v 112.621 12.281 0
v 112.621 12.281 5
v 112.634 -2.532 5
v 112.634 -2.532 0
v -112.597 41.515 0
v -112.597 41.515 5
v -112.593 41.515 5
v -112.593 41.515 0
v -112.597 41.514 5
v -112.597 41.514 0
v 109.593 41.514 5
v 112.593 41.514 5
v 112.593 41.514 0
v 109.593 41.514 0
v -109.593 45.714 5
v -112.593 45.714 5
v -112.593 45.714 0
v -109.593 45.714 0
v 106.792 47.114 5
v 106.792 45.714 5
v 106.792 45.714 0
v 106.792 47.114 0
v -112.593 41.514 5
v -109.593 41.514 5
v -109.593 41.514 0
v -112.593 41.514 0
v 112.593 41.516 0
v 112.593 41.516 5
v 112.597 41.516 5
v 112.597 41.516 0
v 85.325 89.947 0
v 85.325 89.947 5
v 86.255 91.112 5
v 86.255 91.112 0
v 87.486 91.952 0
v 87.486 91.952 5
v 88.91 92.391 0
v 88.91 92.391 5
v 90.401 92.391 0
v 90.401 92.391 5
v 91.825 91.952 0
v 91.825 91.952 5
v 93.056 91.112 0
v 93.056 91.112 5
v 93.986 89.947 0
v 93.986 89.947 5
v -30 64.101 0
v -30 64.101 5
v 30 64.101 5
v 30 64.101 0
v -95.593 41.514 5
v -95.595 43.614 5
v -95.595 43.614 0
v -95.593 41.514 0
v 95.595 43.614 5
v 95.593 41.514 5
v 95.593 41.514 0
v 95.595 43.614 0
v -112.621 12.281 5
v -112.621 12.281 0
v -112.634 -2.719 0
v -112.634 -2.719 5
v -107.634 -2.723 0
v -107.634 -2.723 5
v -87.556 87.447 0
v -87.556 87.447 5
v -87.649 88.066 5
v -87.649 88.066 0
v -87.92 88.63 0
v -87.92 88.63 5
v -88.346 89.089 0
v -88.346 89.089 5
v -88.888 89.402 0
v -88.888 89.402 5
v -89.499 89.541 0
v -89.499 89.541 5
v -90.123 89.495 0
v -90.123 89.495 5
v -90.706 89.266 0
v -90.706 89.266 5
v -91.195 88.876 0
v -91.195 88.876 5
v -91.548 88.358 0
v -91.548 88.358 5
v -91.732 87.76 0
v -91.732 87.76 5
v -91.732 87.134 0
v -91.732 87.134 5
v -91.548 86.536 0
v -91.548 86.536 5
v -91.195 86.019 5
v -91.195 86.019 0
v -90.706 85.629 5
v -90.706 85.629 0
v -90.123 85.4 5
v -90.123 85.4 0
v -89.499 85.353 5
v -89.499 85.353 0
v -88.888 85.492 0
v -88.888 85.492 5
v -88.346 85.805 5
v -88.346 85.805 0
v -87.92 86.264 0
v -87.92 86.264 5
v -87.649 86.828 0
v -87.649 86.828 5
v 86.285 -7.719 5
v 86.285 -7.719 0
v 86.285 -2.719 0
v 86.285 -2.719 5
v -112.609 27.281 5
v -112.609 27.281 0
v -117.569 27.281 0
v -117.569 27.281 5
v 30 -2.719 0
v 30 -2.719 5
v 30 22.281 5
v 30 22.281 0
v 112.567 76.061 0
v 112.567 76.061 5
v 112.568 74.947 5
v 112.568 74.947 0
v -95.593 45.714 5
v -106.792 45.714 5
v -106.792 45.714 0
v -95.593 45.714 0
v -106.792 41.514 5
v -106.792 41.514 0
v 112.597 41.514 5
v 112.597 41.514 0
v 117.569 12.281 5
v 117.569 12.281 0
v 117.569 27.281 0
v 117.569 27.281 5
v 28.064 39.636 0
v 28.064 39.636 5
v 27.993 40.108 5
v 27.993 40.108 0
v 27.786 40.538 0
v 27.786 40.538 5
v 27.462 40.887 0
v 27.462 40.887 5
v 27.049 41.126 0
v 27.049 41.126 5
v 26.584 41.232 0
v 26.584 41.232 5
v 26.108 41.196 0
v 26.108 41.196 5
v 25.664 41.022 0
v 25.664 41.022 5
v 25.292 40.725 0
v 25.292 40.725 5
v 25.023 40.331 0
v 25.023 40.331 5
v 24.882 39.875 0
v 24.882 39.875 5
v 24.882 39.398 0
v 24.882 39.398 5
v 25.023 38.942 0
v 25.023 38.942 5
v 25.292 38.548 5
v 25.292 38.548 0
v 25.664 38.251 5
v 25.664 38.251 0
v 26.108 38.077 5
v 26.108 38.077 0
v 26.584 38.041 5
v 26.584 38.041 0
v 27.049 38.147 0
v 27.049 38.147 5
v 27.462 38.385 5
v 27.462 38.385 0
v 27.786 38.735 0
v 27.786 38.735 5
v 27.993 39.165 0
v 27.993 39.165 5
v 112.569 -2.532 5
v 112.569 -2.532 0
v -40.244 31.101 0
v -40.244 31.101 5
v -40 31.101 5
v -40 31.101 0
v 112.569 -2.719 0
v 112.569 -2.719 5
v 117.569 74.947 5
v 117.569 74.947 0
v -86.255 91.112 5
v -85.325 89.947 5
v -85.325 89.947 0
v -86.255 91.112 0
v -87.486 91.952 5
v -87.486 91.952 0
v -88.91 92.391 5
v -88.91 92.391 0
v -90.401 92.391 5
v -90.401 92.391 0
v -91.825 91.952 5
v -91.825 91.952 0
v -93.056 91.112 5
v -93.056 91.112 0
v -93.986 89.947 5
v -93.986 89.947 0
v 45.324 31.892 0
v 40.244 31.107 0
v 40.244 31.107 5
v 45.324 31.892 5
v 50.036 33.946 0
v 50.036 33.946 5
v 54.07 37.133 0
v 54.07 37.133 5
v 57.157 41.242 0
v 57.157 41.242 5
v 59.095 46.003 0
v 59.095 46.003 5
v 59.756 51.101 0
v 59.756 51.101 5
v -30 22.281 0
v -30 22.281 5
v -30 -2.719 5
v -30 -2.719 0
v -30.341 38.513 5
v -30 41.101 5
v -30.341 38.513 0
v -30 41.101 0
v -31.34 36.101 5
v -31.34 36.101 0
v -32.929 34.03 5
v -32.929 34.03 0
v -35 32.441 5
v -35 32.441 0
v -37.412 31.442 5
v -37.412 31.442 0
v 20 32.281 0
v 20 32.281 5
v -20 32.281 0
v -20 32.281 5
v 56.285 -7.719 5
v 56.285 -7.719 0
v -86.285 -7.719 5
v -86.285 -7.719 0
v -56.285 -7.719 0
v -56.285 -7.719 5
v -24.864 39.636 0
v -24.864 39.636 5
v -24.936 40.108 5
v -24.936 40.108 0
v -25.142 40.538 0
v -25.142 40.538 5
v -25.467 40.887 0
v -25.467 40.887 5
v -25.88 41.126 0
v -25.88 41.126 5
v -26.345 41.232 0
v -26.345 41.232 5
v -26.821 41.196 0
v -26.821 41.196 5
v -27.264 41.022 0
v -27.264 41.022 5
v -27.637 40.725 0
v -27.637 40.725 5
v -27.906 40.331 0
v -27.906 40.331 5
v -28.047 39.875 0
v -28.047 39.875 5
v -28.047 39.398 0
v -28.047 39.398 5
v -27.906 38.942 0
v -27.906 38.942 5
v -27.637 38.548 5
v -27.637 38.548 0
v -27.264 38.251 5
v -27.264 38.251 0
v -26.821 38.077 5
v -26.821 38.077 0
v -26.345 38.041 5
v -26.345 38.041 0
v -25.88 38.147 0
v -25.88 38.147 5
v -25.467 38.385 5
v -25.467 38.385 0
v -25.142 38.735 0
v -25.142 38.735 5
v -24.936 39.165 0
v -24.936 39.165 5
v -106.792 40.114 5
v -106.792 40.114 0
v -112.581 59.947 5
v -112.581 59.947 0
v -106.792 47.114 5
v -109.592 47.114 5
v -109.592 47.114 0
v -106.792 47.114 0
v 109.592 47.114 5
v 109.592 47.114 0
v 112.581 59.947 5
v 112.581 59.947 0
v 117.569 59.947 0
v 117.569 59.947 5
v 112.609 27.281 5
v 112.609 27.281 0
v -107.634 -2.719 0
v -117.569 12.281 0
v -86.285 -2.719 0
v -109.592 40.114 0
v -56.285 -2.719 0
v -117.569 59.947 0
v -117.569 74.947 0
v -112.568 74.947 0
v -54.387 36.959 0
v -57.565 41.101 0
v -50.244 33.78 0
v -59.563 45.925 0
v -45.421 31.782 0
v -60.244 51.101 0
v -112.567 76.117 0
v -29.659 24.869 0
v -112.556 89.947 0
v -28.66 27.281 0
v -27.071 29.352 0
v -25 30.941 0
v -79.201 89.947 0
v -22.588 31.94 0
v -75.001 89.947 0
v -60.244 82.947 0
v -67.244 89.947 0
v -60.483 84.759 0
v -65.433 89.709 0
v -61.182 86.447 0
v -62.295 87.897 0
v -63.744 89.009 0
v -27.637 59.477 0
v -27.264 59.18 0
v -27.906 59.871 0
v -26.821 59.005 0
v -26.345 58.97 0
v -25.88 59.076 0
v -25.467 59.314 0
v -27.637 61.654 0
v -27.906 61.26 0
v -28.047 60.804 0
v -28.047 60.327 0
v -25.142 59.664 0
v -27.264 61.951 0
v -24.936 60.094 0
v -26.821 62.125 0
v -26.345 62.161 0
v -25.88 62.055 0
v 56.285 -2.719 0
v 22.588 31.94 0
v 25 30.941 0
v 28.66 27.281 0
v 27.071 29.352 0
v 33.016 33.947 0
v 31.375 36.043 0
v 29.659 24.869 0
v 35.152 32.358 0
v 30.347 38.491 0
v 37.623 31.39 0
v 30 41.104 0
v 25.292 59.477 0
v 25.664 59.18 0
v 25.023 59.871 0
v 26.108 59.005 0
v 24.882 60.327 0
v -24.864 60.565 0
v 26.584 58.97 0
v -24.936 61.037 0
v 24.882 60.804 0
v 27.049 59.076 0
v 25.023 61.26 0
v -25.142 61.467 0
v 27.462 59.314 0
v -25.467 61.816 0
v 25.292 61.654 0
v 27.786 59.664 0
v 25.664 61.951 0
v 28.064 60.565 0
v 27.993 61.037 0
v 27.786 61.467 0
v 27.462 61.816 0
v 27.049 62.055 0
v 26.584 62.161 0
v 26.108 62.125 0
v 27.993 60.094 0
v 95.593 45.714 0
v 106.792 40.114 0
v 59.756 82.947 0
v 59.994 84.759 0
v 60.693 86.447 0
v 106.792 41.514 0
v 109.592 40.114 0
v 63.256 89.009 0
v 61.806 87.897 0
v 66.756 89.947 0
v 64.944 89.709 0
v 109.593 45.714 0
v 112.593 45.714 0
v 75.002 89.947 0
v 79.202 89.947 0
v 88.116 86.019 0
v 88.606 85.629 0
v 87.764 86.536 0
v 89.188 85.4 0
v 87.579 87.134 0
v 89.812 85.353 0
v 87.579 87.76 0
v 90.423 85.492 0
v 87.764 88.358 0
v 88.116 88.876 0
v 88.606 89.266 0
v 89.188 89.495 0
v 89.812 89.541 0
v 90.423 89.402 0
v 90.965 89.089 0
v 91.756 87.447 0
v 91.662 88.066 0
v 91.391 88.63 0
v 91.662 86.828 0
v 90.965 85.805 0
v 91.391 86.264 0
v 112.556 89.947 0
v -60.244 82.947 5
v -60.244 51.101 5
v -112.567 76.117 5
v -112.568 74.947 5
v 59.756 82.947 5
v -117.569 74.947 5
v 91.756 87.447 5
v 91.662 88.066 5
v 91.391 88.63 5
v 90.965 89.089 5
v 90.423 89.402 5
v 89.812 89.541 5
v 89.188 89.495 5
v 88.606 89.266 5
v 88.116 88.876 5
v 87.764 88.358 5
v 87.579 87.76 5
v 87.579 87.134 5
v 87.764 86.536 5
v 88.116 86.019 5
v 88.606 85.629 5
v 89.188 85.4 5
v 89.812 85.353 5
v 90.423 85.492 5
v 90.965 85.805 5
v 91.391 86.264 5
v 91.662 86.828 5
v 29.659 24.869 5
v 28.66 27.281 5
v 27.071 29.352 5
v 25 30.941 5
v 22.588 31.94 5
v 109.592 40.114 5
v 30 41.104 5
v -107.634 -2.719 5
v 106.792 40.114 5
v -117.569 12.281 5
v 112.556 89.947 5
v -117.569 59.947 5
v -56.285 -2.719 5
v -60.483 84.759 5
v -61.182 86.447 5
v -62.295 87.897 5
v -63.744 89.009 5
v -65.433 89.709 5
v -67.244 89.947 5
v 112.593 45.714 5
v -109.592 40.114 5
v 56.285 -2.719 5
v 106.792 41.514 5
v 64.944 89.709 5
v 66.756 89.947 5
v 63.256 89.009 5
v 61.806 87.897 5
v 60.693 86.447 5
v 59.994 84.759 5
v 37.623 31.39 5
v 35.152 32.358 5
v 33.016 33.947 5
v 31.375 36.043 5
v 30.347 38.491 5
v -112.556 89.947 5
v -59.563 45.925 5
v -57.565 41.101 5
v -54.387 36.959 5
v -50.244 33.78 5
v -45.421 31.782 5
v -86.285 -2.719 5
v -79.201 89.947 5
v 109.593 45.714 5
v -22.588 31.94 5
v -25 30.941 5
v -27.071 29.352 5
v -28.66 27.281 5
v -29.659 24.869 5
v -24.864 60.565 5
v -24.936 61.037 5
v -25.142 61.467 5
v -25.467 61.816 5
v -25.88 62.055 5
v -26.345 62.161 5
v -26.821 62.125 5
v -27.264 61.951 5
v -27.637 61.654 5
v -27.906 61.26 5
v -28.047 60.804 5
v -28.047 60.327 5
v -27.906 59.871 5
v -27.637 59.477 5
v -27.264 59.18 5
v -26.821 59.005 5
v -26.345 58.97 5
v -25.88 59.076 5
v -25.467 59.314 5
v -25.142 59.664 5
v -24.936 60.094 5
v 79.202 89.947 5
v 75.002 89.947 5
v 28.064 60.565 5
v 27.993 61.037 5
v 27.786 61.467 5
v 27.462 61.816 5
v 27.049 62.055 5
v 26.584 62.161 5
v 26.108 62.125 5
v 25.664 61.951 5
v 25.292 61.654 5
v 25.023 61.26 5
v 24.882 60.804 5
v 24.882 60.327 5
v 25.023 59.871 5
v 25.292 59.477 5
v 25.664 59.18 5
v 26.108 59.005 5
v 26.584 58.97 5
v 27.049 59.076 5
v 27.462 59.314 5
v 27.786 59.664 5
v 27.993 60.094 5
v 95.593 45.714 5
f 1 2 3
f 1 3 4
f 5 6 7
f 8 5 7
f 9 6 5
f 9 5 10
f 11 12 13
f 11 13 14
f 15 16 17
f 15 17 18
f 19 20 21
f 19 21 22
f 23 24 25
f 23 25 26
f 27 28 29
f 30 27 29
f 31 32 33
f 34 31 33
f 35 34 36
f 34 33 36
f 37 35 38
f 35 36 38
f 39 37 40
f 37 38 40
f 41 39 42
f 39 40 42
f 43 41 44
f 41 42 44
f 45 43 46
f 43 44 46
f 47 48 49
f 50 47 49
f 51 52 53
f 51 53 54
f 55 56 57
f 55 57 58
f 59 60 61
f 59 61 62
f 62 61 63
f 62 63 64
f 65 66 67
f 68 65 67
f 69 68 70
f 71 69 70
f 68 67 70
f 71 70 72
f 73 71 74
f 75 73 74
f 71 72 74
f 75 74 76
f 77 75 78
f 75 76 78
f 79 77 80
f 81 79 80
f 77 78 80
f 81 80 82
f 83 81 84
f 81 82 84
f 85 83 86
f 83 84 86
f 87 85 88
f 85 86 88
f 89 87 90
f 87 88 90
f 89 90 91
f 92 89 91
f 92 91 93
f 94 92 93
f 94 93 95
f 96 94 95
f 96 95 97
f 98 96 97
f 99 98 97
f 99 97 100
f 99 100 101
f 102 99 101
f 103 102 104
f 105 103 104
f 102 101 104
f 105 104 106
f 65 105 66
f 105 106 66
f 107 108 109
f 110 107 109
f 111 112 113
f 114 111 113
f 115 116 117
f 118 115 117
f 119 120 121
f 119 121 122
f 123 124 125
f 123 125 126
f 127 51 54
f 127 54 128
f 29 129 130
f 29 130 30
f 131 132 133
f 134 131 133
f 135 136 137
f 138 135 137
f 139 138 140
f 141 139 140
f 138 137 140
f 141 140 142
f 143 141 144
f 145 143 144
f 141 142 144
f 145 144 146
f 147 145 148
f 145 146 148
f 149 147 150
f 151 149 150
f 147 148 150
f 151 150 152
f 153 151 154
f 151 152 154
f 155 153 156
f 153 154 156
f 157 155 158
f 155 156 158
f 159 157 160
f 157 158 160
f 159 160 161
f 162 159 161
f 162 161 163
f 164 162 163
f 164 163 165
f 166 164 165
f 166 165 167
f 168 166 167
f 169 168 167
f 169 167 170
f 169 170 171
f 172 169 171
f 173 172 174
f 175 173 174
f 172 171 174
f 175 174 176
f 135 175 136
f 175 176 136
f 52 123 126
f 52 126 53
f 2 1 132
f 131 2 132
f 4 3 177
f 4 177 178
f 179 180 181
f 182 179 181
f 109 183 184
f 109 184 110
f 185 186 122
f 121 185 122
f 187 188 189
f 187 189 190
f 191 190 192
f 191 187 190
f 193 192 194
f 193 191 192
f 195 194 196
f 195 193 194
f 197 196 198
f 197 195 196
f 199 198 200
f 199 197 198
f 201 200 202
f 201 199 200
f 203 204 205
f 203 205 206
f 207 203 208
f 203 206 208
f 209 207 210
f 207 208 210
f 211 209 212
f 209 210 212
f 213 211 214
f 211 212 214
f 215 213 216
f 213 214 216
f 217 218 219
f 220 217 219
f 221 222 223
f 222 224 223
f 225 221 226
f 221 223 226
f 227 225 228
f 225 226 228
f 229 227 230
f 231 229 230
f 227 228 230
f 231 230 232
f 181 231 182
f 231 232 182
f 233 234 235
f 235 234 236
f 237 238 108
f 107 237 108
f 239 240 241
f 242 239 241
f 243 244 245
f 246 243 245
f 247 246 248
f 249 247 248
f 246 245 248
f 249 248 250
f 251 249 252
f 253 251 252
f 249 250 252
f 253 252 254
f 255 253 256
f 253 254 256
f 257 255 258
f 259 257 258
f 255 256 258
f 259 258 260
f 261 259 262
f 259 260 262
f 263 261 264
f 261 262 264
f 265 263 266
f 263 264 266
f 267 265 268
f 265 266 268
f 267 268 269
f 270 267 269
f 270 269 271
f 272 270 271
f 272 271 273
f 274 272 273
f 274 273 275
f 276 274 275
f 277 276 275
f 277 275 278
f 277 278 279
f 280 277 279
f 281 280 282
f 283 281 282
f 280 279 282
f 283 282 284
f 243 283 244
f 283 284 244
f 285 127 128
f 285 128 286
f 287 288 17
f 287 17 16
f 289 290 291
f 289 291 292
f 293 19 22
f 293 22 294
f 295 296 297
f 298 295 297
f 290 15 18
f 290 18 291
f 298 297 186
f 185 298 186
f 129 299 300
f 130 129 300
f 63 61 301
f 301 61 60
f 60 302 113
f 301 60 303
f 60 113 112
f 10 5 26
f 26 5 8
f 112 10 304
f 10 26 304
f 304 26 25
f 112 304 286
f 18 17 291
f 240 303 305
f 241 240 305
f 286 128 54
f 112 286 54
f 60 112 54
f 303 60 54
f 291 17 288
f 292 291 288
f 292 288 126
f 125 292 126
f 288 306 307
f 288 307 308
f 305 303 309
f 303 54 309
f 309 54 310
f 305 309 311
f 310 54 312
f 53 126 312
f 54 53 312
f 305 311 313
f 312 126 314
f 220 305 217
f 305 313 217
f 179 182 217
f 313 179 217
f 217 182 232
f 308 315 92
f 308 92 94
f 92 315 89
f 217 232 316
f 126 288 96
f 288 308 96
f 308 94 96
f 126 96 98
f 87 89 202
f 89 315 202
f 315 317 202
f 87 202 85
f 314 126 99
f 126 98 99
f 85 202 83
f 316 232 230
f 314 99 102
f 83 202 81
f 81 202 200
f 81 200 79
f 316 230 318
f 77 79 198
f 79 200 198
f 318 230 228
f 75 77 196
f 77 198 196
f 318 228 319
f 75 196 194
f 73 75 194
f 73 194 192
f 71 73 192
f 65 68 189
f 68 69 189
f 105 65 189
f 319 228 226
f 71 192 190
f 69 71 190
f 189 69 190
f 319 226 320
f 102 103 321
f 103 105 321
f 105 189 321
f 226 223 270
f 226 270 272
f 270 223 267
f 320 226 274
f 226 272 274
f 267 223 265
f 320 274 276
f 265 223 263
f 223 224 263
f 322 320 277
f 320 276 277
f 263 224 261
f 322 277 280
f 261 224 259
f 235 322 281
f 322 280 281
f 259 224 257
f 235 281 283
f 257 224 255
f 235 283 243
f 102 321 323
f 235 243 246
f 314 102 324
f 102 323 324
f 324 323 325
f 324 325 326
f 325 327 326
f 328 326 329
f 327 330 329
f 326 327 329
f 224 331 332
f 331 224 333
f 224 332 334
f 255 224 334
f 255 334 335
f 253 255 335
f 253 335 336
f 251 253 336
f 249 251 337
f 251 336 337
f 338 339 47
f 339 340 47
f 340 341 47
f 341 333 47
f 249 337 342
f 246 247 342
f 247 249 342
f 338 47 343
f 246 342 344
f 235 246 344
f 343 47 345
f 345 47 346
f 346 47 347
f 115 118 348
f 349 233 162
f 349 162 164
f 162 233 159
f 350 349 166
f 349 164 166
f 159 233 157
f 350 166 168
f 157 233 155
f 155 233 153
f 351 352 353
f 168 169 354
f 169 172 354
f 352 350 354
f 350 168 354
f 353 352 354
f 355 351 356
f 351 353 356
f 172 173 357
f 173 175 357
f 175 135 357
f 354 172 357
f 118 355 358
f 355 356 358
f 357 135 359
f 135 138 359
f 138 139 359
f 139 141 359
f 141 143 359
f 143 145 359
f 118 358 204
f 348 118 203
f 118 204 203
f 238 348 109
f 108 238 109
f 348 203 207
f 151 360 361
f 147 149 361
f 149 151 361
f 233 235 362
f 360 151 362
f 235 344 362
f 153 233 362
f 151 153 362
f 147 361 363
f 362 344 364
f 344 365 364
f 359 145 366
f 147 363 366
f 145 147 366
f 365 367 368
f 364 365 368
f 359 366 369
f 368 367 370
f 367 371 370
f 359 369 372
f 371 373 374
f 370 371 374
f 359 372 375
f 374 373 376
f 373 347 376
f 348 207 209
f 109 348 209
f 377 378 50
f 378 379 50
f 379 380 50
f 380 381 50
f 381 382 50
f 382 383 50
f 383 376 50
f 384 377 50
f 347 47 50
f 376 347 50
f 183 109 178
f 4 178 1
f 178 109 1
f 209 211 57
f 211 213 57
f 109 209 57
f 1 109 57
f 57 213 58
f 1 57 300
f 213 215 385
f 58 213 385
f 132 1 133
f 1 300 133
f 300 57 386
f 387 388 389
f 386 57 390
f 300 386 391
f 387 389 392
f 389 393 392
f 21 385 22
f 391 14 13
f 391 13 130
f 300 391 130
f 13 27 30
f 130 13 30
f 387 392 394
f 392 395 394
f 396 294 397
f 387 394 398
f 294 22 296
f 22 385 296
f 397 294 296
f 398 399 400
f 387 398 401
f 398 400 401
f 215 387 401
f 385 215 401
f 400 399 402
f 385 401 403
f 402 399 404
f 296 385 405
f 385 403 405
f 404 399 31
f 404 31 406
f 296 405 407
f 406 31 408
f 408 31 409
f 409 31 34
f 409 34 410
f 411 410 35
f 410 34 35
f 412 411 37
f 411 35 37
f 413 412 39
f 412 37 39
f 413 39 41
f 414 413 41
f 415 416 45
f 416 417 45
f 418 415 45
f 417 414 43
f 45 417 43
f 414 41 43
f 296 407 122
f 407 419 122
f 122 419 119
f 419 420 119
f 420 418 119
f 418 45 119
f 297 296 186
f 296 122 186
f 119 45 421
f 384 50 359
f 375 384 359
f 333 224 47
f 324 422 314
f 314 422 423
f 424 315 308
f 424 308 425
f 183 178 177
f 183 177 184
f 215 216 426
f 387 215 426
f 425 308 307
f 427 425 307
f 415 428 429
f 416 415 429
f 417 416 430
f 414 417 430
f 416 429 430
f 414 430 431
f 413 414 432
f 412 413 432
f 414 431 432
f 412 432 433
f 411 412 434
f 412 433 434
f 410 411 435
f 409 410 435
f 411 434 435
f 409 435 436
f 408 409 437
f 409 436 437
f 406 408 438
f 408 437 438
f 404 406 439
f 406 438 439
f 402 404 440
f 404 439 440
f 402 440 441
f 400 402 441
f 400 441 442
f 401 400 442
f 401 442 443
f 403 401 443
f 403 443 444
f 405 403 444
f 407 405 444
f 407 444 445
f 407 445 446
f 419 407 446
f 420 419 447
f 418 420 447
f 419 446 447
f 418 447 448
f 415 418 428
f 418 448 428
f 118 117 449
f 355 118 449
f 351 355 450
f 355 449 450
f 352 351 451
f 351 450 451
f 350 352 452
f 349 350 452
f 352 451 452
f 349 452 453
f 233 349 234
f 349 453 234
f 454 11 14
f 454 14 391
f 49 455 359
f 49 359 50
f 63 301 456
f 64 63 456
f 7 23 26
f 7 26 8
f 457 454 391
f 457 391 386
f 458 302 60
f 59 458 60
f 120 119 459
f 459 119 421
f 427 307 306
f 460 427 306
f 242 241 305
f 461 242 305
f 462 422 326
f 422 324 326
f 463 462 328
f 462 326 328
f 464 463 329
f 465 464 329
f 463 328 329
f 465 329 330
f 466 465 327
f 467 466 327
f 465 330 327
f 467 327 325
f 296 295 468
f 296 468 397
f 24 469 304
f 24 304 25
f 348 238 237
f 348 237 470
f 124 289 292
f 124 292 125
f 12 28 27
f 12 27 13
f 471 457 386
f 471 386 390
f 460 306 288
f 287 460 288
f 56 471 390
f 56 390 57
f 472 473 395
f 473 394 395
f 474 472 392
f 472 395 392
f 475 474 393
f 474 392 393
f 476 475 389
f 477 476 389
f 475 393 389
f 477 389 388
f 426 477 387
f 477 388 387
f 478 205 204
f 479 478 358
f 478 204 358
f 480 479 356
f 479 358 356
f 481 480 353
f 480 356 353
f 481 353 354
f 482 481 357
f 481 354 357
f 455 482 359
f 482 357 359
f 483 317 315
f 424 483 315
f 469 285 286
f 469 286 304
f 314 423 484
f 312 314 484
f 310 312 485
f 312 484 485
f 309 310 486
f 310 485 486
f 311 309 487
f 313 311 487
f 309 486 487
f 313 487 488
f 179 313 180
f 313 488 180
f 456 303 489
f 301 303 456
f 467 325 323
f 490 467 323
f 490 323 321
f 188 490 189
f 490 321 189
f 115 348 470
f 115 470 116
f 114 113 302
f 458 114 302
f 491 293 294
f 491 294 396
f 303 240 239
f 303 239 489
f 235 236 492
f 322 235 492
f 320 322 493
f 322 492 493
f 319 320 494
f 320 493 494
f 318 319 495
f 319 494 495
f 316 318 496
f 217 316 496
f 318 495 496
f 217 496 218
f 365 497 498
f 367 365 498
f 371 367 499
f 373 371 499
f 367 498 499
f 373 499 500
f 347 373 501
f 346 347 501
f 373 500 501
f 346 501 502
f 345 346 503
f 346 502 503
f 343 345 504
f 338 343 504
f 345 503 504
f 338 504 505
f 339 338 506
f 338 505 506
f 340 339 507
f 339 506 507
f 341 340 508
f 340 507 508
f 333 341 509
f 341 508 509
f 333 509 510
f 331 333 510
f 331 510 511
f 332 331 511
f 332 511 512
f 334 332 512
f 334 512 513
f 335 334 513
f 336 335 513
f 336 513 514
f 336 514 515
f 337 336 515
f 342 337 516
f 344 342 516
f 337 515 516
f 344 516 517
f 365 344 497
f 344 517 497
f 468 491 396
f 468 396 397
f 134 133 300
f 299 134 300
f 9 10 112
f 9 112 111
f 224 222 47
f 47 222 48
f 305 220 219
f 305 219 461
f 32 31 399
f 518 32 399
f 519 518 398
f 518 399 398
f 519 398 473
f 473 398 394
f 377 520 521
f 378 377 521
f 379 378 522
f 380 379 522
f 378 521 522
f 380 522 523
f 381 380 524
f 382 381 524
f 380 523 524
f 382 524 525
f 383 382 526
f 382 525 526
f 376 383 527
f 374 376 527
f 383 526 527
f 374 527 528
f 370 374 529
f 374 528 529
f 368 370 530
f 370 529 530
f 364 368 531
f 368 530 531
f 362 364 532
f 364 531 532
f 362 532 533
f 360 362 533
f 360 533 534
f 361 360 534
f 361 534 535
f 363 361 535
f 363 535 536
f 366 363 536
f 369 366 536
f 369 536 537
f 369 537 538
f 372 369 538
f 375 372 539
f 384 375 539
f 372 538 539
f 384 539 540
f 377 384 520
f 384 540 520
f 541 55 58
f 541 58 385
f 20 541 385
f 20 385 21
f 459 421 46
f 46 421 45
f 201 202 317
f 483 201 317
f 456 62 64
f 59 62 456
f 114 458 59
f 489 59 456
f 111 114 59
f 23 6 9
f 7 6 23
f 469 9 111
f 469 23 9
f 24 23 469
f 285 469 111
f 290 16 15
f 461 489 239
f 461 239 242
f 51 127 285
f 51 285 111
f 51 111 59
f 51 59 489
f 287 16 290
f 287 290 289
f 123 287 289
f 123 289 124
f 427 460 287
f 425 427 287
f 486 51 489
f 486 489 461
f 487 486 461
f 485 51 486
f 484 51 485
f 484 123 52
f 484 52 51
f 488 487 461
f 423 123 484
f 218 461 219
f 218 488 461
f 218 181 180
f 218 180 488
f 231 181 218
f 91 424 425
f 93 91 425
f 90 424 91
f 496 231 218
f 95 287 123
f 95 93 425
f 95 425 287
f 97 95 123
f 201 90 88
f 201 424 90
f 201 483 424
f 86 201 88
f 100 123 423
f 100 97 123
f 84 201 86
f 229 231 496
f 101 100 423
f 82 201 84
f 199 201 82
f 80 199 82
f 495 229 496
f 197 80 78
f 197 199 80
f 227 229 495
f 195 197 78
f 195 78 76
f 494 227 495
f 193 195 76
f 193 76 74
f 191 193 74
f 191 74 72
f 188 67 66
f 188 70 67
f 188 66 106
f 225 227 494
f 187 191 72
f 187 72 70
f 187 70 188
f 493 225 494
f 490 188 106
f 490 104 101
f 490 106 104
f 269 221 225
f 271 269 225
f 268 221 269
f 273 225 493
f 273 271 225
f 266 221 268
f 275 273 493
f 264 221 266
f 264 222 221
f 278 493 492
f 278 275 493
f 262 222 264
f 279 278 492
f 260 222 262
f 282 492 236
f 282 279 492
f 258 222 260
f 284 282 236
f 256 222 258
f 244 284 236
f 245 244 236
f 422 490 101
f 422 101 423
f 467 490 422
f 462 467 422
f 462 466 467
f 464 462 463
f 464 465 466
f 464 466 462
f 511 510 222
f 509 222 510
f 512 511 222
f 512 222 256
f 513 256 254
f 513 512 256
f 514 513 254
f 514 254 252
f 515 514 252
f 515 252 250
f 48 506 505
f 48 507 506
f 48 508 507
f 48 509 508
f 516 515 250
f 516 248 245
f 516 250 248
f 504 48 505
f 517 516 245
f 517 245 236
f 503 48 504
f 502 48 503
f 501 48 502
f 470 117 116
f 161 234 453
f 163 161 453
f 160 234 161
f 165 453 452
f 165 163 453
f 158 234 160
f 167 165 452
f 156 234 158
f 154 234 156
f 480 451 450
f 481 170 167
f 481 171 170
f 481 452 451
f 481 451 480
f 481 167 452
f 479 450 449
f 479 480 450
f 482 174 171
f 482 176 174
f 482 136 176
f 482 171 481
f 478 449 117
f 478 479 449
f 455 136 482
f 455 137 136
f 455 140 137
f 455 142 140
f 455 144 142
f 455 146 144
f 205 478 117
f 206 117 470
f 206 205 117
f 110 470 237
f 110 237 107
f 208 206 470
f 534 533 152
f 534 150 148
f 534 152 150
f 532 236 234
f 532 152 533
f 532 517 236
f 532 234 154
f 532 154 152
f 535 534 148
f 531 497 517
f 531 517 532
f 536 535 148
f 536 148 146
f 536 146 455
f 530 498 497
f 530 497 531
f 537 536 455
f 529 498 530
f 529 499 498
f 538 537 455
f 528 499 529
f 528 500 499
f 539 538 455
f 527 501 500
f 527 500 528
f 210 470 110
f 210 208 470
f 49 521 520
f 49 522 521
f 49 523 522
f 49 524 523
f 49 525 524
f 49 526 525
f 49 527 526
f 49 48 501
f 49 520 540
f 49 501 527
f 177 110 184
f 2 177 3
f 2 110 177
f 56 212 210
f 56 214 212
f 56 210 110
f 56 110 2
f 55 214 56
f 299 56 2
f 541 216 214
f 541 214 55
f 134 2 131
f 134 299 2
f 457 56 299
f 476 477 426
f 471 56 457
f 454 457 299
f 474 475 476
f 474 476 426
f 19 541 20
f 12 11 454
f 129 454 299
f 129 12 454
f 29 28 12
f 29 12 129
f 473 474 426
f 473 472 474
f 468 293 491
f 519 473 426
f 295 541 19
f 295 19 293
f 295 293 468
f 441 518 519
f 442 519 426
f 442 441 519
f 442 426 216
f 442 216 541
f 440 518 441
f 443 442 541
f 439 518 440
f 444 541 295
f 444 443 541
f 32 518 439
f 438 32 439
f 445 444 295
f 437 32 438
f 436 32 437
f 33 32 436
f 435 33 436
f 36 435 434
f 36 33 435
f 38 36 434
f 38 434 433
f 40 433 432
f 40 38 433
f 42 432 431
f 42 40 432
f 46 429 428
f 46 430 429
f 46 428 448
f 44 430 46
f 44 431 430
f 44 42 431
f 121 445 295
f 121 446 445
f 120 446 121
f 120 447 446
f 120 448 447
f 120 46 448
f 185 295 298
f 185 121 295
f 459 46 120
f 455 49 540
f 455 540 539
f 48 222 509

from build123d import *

# Parameters (mm, degrees)
BOSS_EXTRUDE1_DEPTH     = 5
BOSS_EXTRUDE2_START     = -5
BOSS_EXTRUDE2_DEPTH     = 5
CUT_EXTRUDE1_DEPTH      = 5
FILLET1_R               = 7
SKETCH5_W               = 60
SKETCH5_H               = 33
BOSS_EXTRUDE3_DEPTH     = 5
SKETCH6_R               = 1.6
CUT_EXTRUDE2_DEPTH      = 5
CUT_EXTRUDE3_START      = -5
CUT_EXTRUDE3_DEPTH      = 5
CUT_EXTRUDE4_DEPTH      = 10
FILLET2_R               = 10
BOSS_EXTRUDE5_START     = -5
BOSS_EXTRUDE5_OUTLINE_W = 30
BOSS_EXTRUDE5_OUTLINE_H = 5
BOSS_EXTRUDE5_DEPTH     = 5
SKETCH12_W              = 5
SKETCH12_H              = 92.666318873
BOSS_EXTRUDE6_DEPTH     = 5
SKETCH13_W              = 5
SKETCH13_H              = 92.479626066
BOSS_EXTRUDE7_DEPTH     = 11
SKETCH14_W              = 14.125243299
SKETCH14_H              = 18.417399827
SKETCH14_W_2            = 17.448829958
BOSS_EXTRUDE8_DEPTH     = 5
CUT_EXTRUDE5_DEPTH      = 5
SKETCH17_W              = 6.263528668
SKETCH17_H              = 4.2
SKETCH17_W_2            = 6.634448871
CUT_EXTRUDE6_DEPTH      = 5
BOSS_EXTRUDE9_DEPTH     = 5
CUT_EXTRUDE7_DEPTH      = 5
SKETCH21_W              = 3.746111535
SKETCH21_H              = 4.198684894
SKETCH21_W_2            = 4.081394213
SKETCH21_H_2            = 4.198442995
CUT_EXTRUDE8_DEPTH      = 5
BOSS_EXTRUDE10_DEPTH    = 5
SKETCH23_R              = 2.1
CUT_EXTRUDE9_DEPTH      = 5


# Read off the part's stored shape, not the designer's step: Cut-Extrude3, Boss-Extrude5
with BuildPart() as part:
    # Sketch1 → Boss-Extrude1 (new body)
    with BuildSketch(Plane.XY):
        with BuildLine():
            Line((-112.555529977, 89.947234922), (-112.567255319, 76.117234919))
            Line((-112.567255319, 76.117234919), (-109.550918722, 76.117234919))
            Line((-109.550918722, 76.117234919), (-109.550918722, 77.517234919))
            Line((-109.550918722, 77.517234919), (-106.750918722, 77.517234919))
            Line((-106.750918722, 77.517234919), (-106.750918722, 76.117234919))
            Line((-106.750918722, 76.117234919), (-95.550918722, 76.117234919))
            Line((-95.550918722, 76.117234919), (-95.550918722, 71.917234919))
            Line((-95.550918722, 71.917234919), (-106.750918722, 71.917234919))
            Line((-106.750918722, 71.917234919), (-106.750918722, 70.517234919))
            Line((-106.750918722, 70.517234919), (-109.550918722, 70.517234919))
            Line((-109.550918722, 70.517234919), (-109.550918722, 71.917234919))
            Line((-109.550918722, 71.917234919), (-112.5683672, 71.917234919))
            Line((-112.5683672, 71.917234919), (-112.56855454, 63.078549452))
            Line((-112.56855454, 63.078549452), (-112.56855454, 58.070468723))
            ThreePointArc((-112.56855454, 58.070468723), (-109.295273663, 56.47724277), (-107.97, 53.086610624))
            Line((-107.97, 53.086610624), (-107.97, -29.899029756))
            ThreePointArc((-107.97, -29.899029756), (-109.295765386, -33.290194747), (-112.57, -34.883004073))
            Line((-112.57, -34.883004073), (-112.57, -63.301209568))
            Line((-112.57, -63.301209568), (-109.57, -63.301209568))
            Line((-109.57, -63.301209568), (-109.57, -61.901209568))
            Line((-109.57, -61.901209568), (-106.77, -61.901209568))
            Line((-106.77, -61.901209568), (-106.77, -63.301209568))
            Line((-106.77, -63.301209568), (-95.57, -63.301209568))
            Line((-95.57, -63.301209568), (-95.57, -67.501209568))
            Line((-95.57, -67.501209568), (-106.77, -67.501209568))
            Line((-106.77, -67.501209568), (-106.77, -68.901209568))
            Line((-106.77, -68.901209568), (-109.57, -68.901209568))
            Line((-109.57, -68.901209568), (-109.57, -67.501209568))
            Line((-109.57, -67.501209568), (-112.57, -67.501209568))
            Line((-112.57, -67.501209568), (-112.57, -90.906209566))
            Line((-112.57, -90.906209566), (-94.225, -90.906209566))
            Line((-94.225, -90.906209566), (-94.225, -87.906209568))
            Line((-94.225, -87.906209568), (-95.625, -87.906209568))
            Line((-95.625, -87.906209568), (-95.625, -85.106209568))
            Line((-95.625, -85.106209568), (-94.225, -85.106209568))
            Line((-94.225, -85.106209568), (-94.225, -73.906209568))
            Line((-94.225, -73.906209568), (-90.025, -73.906209568))
            Line((-90.025, -73.906209568), (-90.025, -85.106209568))
            Line((-90.025, -85.106209568), (-88.625, -85.106209568))
            Line((-88.625, -85.106209568), (-88.625, -87.906209568))
            Line((-88.625, -87.906209568), (-90.025, -87.906209568))
            Line((-90.025, -87.906209568), (-90.025, -90.906209566))
            Line((-90.025, -90.906209566), (-74.478184725, -90.906209566))
            Line((-74.478184725, -90.906209566), (-58.579544248, -63.368956488))
            Line((-58.579544248, -63.368956488), (-61.177620458, -61.868956489))
            Line((-61.177620458, -61.868956489), (-61.877620458, -63.081392054))
            Line((-61.877620458, -63.081392054), (-64.302491589, -61.681392054))
            Line((-64.302491589, -61.681392054), (-63.602491589, -60.468956489))
            Line((-63.602491589, -60.468956489), (-73.301976111, -54.868956489))
            Line((-73.301976111, -54.868956489), (-71.201976111, -51.231649793))
            Line((-71.201976111, -51.231649793), (-61.502491589, -56.831649793))
            Line((-61.502491589, -56.831649793), (-60.802491589, -55.619214227))
            Line((-60.802491589, -55.619214227), (-58.377620458, -57.019214227))
            Line((-58.377620458, -57.019214227), (-59.077620458, -58.231649793))
            Line((-59.077620458, -58.231649793), (-56.479544248, -59.731649792))
            Line((-56.479544248, -59.731649792), (-39.837168574, -30.906209566))
            Line((-39.837168574, -30.906209566), (-2.099582772, -30.906209566))
            Line((-2.099582772, -30.906209566), (-2.099582772, -27.906209566))
            Line((-2.099582772, -27.906209566), (-3.499582772, -27.906209566))
            Line((-3.499582772, -27.906209566), (-3.499582772, -25.106209566))
            Line((-3.499582772, -25.106209566), (-2.099582772, -25.106209566))
            Line((-2.099582772, -25.106209566), (-2.099582772, -13.906209566))
            Line((-2.099582772, -13.906209566), (2.100417228, -13.906209566))
            Line((2.100417228, -13.906209566), (2.100417228, -25.106209566))
            Line((2.100417228, -25.106209566), (3.500417228, -25.106209566))
            Line((3.500417228, -25.106209566), (3.500417228, -27.906209566))
            Line((3.500417228, -27.906209566), (2.100417228, -27.906209566))
            Line((2.100417228, -27.906209566), (2.100417228, -30.906209566))
            Line((2.100417228, -30.906209566), (39.837168574, -30.906209566))
            Line((39.837168574, -30.906209566), (56.479752862, -59.732011122))
            Line((56.479752862, -59.732011122), (59.078454915, -58.231649793))
            Line((59.078454915, -58.231649793), (58.378454915, -57.019214227))
            Line((58.378454915, -57.019214227), (60.803326045, -55.619214227))
            Line((60.803326045, -55.619214227), (61.503326045, -56.831649793))
            Line((61.503326045, -56.831649793), (71.202810568, -51.231649793))
            Line((71.202810568, -51.231649793), (73.302810568, -54.868956489))
            Line((73.302810568, -54.868956489), (63.603326045, -60.468956489))
            Line((63.603326045, -60.468956489), (64.303326045, -61.681392054))
            Line((64.303326045, -61.681392054), (61.878454915, -63.081392054))
            Line((61.878454915, -63.081392054), (61.178454915, -61.868956489))
            Line((61.178454915, -61.868956489), (58.580378703, -63.368956489))
            Line((58.580378703, -63.368956489), (74.478184725, -90.906209566))
            Line((74.478184725, -90.906209566), (90.025834456, -90.906209566))
            Line((90.025834456, -90.906209566), (90.025834456, -87.906209568))
            Line((90.025834456, -87.906209568), (88.625834456, -87.906209568))
            Line((88.625834456, -87.906209568), (88.625834456, -85.106209568))
            Line((88.625834456, -85.106209568), (90.025834456, -85.106209568))
            Line((90.025834456, -85.106209568), (90.025834456, -73.906209568))
            Line((90.025834456, -73.906209568), (94.225834456, -73.906209568))
            Line((94.225834456, -73.906209568), (94.225834456, -85.106209568))
            Line((94.225834456, -85.106209568), (95.625834456, -85.106209568))
            Line((95.625834456, -85.106209568), (95.625834456, -87.906209568))
            Line((95.625834456, -87.906209568), (94.225834456, -87.906209568))
            Line((94.225834456, -87.906209568), (94.225834456, -90.906209566))
            Line((94.225834456, -90.906209566), (112.57, -90.906209566))
            Line((112.57, -90.906209566), (112.57, -67.501209568))
            Line((112.57, -67.501209568), (109.570834456, -67.501209568))
            Line((109.570834456, -67.501209568), (109.570834456, -68.901209568))
            Line((109.570834456, -68.901209568), (106.770834456, -68.901209568))
            Line((106.770834456, -68.901209568), (106.770834456, -67.501209568))
            Line((106.770834456, -67.501209568), (95.570834456, -67.501209568))
            Line((95.570834456, -67.501209568), (95.570834456, -63.301209568))
            Line((95.570834456, -63.301209568), (106.770834456, -63.301209568))
            Line((106.770834456, -63.301209568), (106.770834456, -61.901209568))
            Line((106.770834456, -61.901209568), (109.570834456, -61.901209568))
            Line((109.570834456, -61.901209568), (109.570834456, -63.301209568))
            Line((109.570834456, -63.301209568), (112.57, -63.301209568))
            Line((112.57, -63.301209568), (112.57, -34.883004073))
            ThreePointArc((112.57, -34.883004073), (109.295765386, -33.290194747), (107.97, -29.899029756))
            Line((107.97, -29.899029756), (107.97, 53.086610624))
            ThreePointArc((107.97, 53.086610624), (109.295273663, 56.47724277), (112.56855454, 58.070468723))
            Line((112.56855454, 58.070468723), (112.56855454, 63.078549452))
            Line((112.56855454, 63.078549452), (112.5683672, 71.917234919))
            Line((112.5683672, 71.917234919), (109.551753179, 71.917234919))
            Line((109.551753179, 71.917234919), (109.551753179, 70.517234919))
            Line((109.551753179, 70.517234919), (106.751753179, 70.517234919))
            Line((106.751753179, 70.517234919), (106.751753179, 71.917234919))
            Line((106.751753179, 71.917234919), (95.551753179, 71.917234919))
            Line((95.551753179, 71.917234919), (95.551753179, 76.117234919))
            Line((95.551753179, 76.117234919), (106.751753179, 76.117234919))
            Line((106.751753179, 76.117234919), (106.751753179, 77.517234919))
            Line((106.751753179, 77.517234919), (109.551753179, 77.517234919))
            Line((109.551753179, 77.517234919), (109.551753179, 76.117234919))
            Line((109.551753179, 76.117234919), (112.550918722, 76.117234919))
            Line((112.550918722, 76.117234919), (112.567303227, 76.060727176))
            Line((112.567303227, 76.060727176), (112.555529977, 89.947234922))
            Line((112.555529977, 89.947234922), (79.201753179, 89.947234922))
            Line((79.201753179, 89.947234922), (79.201753179, 86.947234919))
            Line((79.201753179, 86.947234919), (80.601753179, 86.947234919))
            Line((80.601753179, 86.947234919), (80.601753179, 84.147234919))
            Line((80.601753179, 84.147234919), (79.201753179, 84.147234919))
            Line((79.201753179, 84.147234919), (79.201753179, 72.947234919))
            Line((79.201753179, 72.947234919), (75.001753179, 72.947234919))
            Line((75.001753179, 72.947234919), (75.001753179, 84.147234919))
            Line((75.001753179, 84.147234919), (73.601753179, 84.147234919))
            Line((73.601753179, 84.147234919), (73.601753179, 86.947234919))
            Line((73.601753179, 86.947234919), (75.001753179, 86.947234919))
            Line((75.001753179, 86.947234919), (75.001753179, 89.947234922))
            Line((75.001753179, 89.947234922), (30, 89.947234922))
            Line((30, 89.947234922), (30, 57.382012806))
            Line((30, 57.382012806), (-30, 57.382012806))
            Line((-30, 57.382012806), (-30, 89.947234922))
            Line((-30, 89.947234922), (-75.000918722, 89.947234922))
            Line((-75.000918722, 89.947234922), (-75.000918722, 86.947234919))
            Line((-75.000918722, 86.947234919), (-73.600918722, 86.947234919))
            Line((-73.600918722, 86.947234919), (-73.600918722, 84.147234919))
            Line((-73.600918722, 84.147234919), (-75.000918722, 84.147234919))
            Line((-75.000918722, 84.147234919), (-75.000918722, 72.947234919))
            Line((-75.000918722, 72.947234919), (-79.200918722, 72.947234919))
            Line((-79.200918722, 72.947234919), (-79.200918722, 84.147234919))
            Line((-79.200918722, 84.147234919), (-80.600918722, 84.147234919))
            Line((-80.600918722, 84.147234919), (-80.600918722, 86.947234919))
            Line((-80.600918722, 86.947234919), (-79.200918722, 86.947234919))
            Line((-79.200918722, 86.947234919), (-79.200918722, 89.947234922))
            Line((-79.200918722, 89.947234922), (-112.555529977, 89.947234922))
        make_face()
    extrude(amount=BOSS_EXTRUDE1_DEPTH)

    # Sketch2 → Boss-Extrude2 (add)
    with BuildSketch(Plane.XY.offset(5).offset(BOSS_EXTRUDE2_START)):
        with BuildLine():
            Line((112.56855454, 58.070468723), (112.57, -34.883004073))
            ThreePointArc((112.57, -34.883004073), (109.295765386, -33.290194747), (107.97, -29.899029756))
            Line((107.97, -29.899029756), (107.97, 53.086610624))
            ThreePointArc((107.97, 53.086610624), (109.295273663, 56.47724277), (112.56855454, 58.070468723))
        make_face()
        with BuildLine():
            Line((-112.57, -34.883004073), (-112.56855454, 58.070468723))
            ThreePointArc((-112.56855454, 58.070468723), (-109.295273663, 56.47724277), (-107.97, 53.086610624))
            Line((-107.97, 53.086610624), (-107.97, -29.899029756))
            ThreePointArc((-107.97, -29.899029756), (-109.295765386, -33.290194747), (-112.57, -34.883004073))
        make_face()
    extrude(amount=BOSS_EXTRUDE2_DEPTH)

    # Sketch3 → Cut-Extrude1 (cut)
    with BuildSketch(Plane.XY.offset(5)):
        with BuildLine():
            Line((59.755598965, 89.947234922), (-60.244401035, 89.947234922))
            Line((-60.244401035, 89.947234922), (-60.244401035, 51.100894588))
            ThreePointArc((-60.244401035, 51.100894588), (-54.386536659, 36.958758964), (-40.244401035, 31.100894588))
            Line((-40.244401035, 31.100894588), (39.755598965, 31.100894588))
            ThreePointArc((39.755598965, 31.100894588), (53.897734588, 36.958758964), (59.755598965, 51.100894588))
            Line((59.755598965, 51.100894588), (59.755598965, 89.947234922))
        make_face()
    extrude(amount=-CUT_EXTRUDE1_DEPTH, mode=Mode.SUBTRACT)

    # Fillet1
    fillet1_edges = [part.edges().sort_by_distance(p)[0] for p in [
        (-60.244401035, 89.947234922, 2.5),
        (59.755598965, 89.947234922, 2.5),
    ]]
    fillet(fillet1_edges, radius=FILLET1_R)

    # Sketch5 → Boss-Extrude3 (add)
    with BuildSketch(Plane.XY.offset(5)):
        with Locations((-6.023e-06, 47.600894588)):
            Rectangle(SKETCH5_W, SKETCH5_H)
    extrude(amount=-BOSS_EXTRUDE3_DEPTH)

    # Sketch6 → Cut-Extrude2 (cut)
    with BuildSketch(Plane.XY.offset(5)):
        with Locations((-26.464472117, 60.565360682)):
            Circle(SKETCH6_R)
        with Locations((-26.464472117, 39.636428494)):
            Circle(SKETCH6_R)
        with Locations((26.464460071, 60.565360682)):
            Circle(SKETCH6_R)
        with Locations((26.464460071, 39.636428494)):
            Circle(SKETCH6_R)
    extrude(amount=-CUT_EXTRUDE2_DEPTH, mode=Mode.SUBTRACT)

    # Cut-Extrude3 outline → Cut-Extrude3 (cut)
    with BuildSketch(Plane.XY.offset(5).offset(CUT_EXTRUDE3_START)):
        Polygon((112.56949984, -2.719105412), (-112.56949984, -2.719105412), (-112.57, -34.883004073), (-112.57, -63.301209568), (-109.57, -63.301209568), (-109.57, -61.901209568), (-106.77, -61.901209568), (-106.77, -63.301209568), (-95.57, -63.301209568), (-95.57, -67.501209568), (-106.77, -67.501209568), (-106.77, -68.901209568), (-109.57, -68.901209568), (-109.57, -67.501209568), (-112.57, -67.501209568), (-112.57, -90.906209566), (-94.225, -90.906209566), (-94.225, -87.906209568), (-95.625, -87.906209568), (-95.625, -85.106209568), (-94.225, -85.106209568), (-94.225, -73.906209568), (-90.025, -73.906209568), (-90.025, -85.106209568), (-88.625, -85.106209568), (-88.625, -87.906209568), (-90.025, -87.906209568), (-90.025, -90.906209566), (-74.478184725, -90.906209566), (-58.579544248, -63.368956488), (-61.177620458, -61.868956489), (-61.877620458, -63.081392054), (-64.302491589, -61.681392054), (-63.602491589, -60.468956489), (-73.301976111, -54.868956489), (-71.201976111, -51.231649793), (-61.502491589, -56.831649793), (-60.802491589, -55.619214227), (-58.377620458, -57.019214227), (-59.077620458, -58.231649793), (-56.479544248, -59.731649792), (-39.837168574, -30.906209566), (-2.099582772, -30.906209566), (-2.099582772, -27.906209566), (-3.499582772, -27.906209566), (-3.499582772, -25.106209566), (-2.099582772, -25.106209566), (-2.099582772, -13.906209566), (2.100417228, -13.906209566), (2.100417228, -25.106209566), (3.500417228, -25.106209566), (3.500417228, -27.906209566), (2.100417228, -27.906209566), (2.100417228, -30.906209566), (39.837168574, -30.906209566), (56.479752862, -59.732011122), (59.078454915, -58.231649793), (58.378454915, -57.019214227), (60.803326045, -55.619214227), (61.503326045, -56.831649793), (71.202810568, -51.231649793), (73.302810568, -54.868956489), (63.603326045, -60.468956489), (64.303326045, -61.681392054), (61.878454915, -63.081392054), (61.178454915, -61.868956489), (58.580378703, -63.368956489), (58.579752591, -63.369317348), (74.478184725, -90.906209566), (90.025834456, -90.906209566), (90.025834456, -87.906209568), (88.625834456, -87.906209568), (88.625834456, -85.106209568), (90.025834456, -85.106209568), (90.025834456, -73.906209568), (94.225834456, -73.906209568), (94.225834456, -85.106209568), (95.625834456, -85.106209568), (95.625834456, -87.906209568), (94.225834456, -87.906209568), (94.225834456, -90.906209566), (112.57, -90.906209566), (112.57, -67.501209568), (109.570834456, -67.501209568), (109.570834456, -68.901209568), (106.770834456, -68.901209568), (106.770834456, -67.501209568), (95.570834456, -67.501209568), (95.570834456, -63.301209568), (106.770834456, -63.301209568), (106.770834456, -61.901209568), (109.570834456, -61.901209568), (109.570834456, -63.301209568), (112.57, -63.301209568), (112.57, -34.883004073), align=None)
    extrude(amount=CUT_EXTRUDE3_DEPTH, mode=Mode.SUBTRACT)

    # Sketch10 → Cut-Extrude4 (cut)
    with BuildSketch(Plane.XY.offset(5)):
        with BuildLine():
            Line((-30.000006023, -2.719105412), (29.999993977, -2.719105412))
            Line((29.999993977, -2.719105412), (29.999993977, 22.280894588))
            ThreePointArc((29.999993977, 22.280894588), (27.071061789, 29.3519624), (19.999993977, 32.280894588))
            Line((19.999993977, 32.280894588), (-20.000006023, 32.280894588))
            ThreePointArc((-20.000006023, 32.280894588), (-27.071073835, 29.3519624), (-30.000006023, 22.280894588))
            Line((-30.000006023, 22.280894588), (-30.000006023, -2.719105412))
        make_face()
    extrude(amount=-CUT_EXTRUDE4_DEPTH, mode=Mode.SUBTRACT)

    # Fillet2
    fillet2_edges = [part.edges().sort_by_distance(p)[0] for p in [
        (29.999993977, 31.100894588, 2.5),
        (-30.000006023, 31.100894588, 2.5),
    ]]
    fillet(fillet2_edges, radius=FILLET2_R)

    # Boss-Extrude5 outline → Boss-Extrude5 (add)
    with BuildSketch(Plane.XY.offset(5).offset(BOSS_EXTRUDE5_START)):
        with Locations((71.284746908, -5.219105412)):
            Rectangle(BOSS_EXTRUDE5_OUTLINE_W, BOSS_EXTRUDE5_OUTLINE_H)
        Polygon((117.569266584, 27.280894588), (112.569033329, 27.280894588), (112.569266585, 12.280894588), (117.569266584, 12.280894588), align=None)
        Polygon((112.56855454, 59.947234922), (117.56862091, 59.947234922), (117.56862091, 74.947234922), (112.564823831, 74.947234922), (112.564823831, 76.069278248), (112.550918722, 76.117234919), (109.551753179, 76.117234919), (109.551753179, 77.517234919), (106.751753179, 77.517234919), (106.751753179, 76.117234919), (95.551753179, 76.117234919), (95.551753179, 71.917234919), (106.751753179, 71.917234919), (106.751753179, 70.517234919), (109.551753179, 70.517234919), (109.551753179, 71.917234919), (112.5683672, 71.917234919), (112.56855454, 63.078549452), align=None)
        with Locations((-71.284746908, -5.219105412)):
            Rectangle(BOSS_EXTRUDE5_OUTLINE_W, BOSS_EXTRUDE5_OUTLINE_H)
        Polygon((-112.569266585, 12.280894588), (-112.569033329, 27.280894588), (-117.569266584, 27.280894588), (-117.569266584, 12.280894588), align=None)
        Polygon((-117.56862091, 59.947234922), (-112.56855454, 59.947234922), (-112.56855454, 63.078549452), (-112.5683672, 71.917234919), (-109.550918722, 71.917234919), (-109.550918722, 70.517234919), (-106.750918722, 70.517234919), (-106.750918722, 71.917234919), (-95.550918722, 71.917234919), (-95.550918722, 76.117234919), (-106.750918722, 76.117234919), (-106.750918722, 77.517234919), (-109.550918722, 77.517234919), (-109.550918722, 76.117234919), (-112.550918722, 76.117234919), (-112.563061404, 76.0753566), (-112.563061404, 74.947234922), (-117.56862091, 74.947234922), align=None)
    extrude(amount=BOSS_EXTRUDE5_DEPTH)

    # Sketch12 → Boss-Extrude6 (add)
    with BuildSketch(Plane(origin=(-112.631708027, 0.095491345, 0), x_dir=(0, 0, 1), z_dir=(-0.999999640601339, 0.0008478190804530466, 0))):
        with Locations((2.5, 43.518616433)):
            Rectangle(SKETCH12_W, SKETCH12_H)
    extrude(amount=-BOSS_EXTRUDE6_DEPTH)

    # Sketch13 → Boss-Extrude7 (add)
    with BuildSketch(Plane(origin=(112.631708027, 0.095491345, 0), x_dir=(0, 0, -1), z_dir=(0.999999640601339, 0.0008478190804733425, 0))):
        with Locations((-2.5, 43.611962836)):
            Rectangle(SKETCH13_W, SKETCH13_H)
    extrude(amount=-BOSS_EXTRUDE7_DEPTH)

    # Sketch14 → Boss-Extrude8 (add)
    with BuildSketch(Plane.XY.offset(5)):
        with Locations((-76.769807505, 80.738535009)):
            Rectangle(SKETCH14_W, SKETCH14_H)
        with Locations((77.36152379, 80.738535009)):
            Rectangle(SKETCH14_W_2, SKETCH14_H)
    extrude(amount=-BOSS_EXTRUDE8_DEPTH)

    # Sketch16 → Cut-Extrude5 (cut)
    with BuildSketch(Plane.XY.offset(5)):
        Polygon((-112.594812137, 43.614064755), (-112.593031716, 45.714064755), (-107.593029919, 45.714064755), (-107.590571243, 48.614064755), (-97.590571243, 48.614064755), (-97.590571243, 38.614064755), (-107.590571243, 38.614064755), (-107.593029919, 41.514064755), (-112.593031716, 41.514064755), align=None)
        Polygon((112.594812137, 43.614064755), (112.593031716, 41.514064755), (107.593029919, 41.514064755), (107.590571243, 38.614064755), (97.590571243, 38.614064755), (97.590571243, 48.614064755), (107.590571243, 48.614064755), (107.593029919, 45.714064755), (112.593031716, 45.714064755), align=None)
    extrude(amount=-CUT_EXTRUDE5_DEPTH, mode=Mode.SUBTRACT)

    # Sketch17 → Cut-Extrude6 (cut)
    with BuildSketch(Plane.XY.offset(5)):
        with Locations((-110.724794253, 43.614064755)):
            Rectangle(SKETCH17_W, SKETCH17_H)
        with Locations((110.910254355, 43.614064755)):
            Rectangle(SKETCH17_W_2, SKETCH17_H)
    extrude(amount=-CUT_EXTRUDE6_DEPTH, mode=Mode.SUBTRACT)

    # Sketch19 → Boss-Extrude9 (add)
    with BuildSketch(Plane.XY.offset(5)):
        Polygon((97.590571243, 38.614064755), (107.590571243, 38.614064755), (107.593029919, 41.514064755), (112.596592557, 41.514064755), (112.593031716, 45.714064755), (107.593029919, 45.714064755), (107.590571243, 48.614064755), (97.590571243, 48.614064755), align=None)
        Polygon((-112.596592557, 41.514064755), (-107.593029919, 41.514064755), (-107.590571243, 38.614064755), (-97.590571243, 38.614064755), (-97.590571243, 48.614064755), (-107.590571243, 48.614064755), (-107.593029919, 45.714064755), (-112.593031716, 45.714064755), align=None)
    extrude(amount=-BOSS_EXTRUDE9_DEPTH)

    # Sketch20 → Cut-Extrude7 (cut)
    with BuildSketch(Plane.XY.offset(5)):
        Polygon((-112.594812137, 43.614064755), (-112.593031716, 45.714064755), (-109.593030638, 45.714064755), (-109.591843691, 47.114064755), (-106.791843691, 47.114064755), (-106.791843691, 45.714064755), (-95.593025606, 45.714064755), (-95.594806027, 43.614064755), (-95.593025606, 41.514064755), (-106.791843691, 41.514064755), (-106.791843691, 40.114064755), (-109.591843691, 40.114064755), (-109.593030638, 41.514064755), (-112.593031716, 41.514064755), align=None)
        Polygon((112.594812137, 43.614064755), (112.593031716, 41.514064755), (109.593030638, 41.514064755), (109.591843691, 40.114064755), (106.791843691, 40.114064755), (106.791843691, 41.514064755), (95.593025606, 41.514064755), (95.594806027, 43.614064755), (95.593025606, 45.714064755), (106.791843691, 45.714064755), (106.791843691, 47.114064755), (109.591843691, 47.114064755), (109.593030638, 45.714064755), (112.593031716, 45.714064755), align=None)
    extrude(amount=-CUT_EXTRUDE7_DEPTH, mode=Mode.SUBTRACT)

    # Sketch21 → Cut-Extrude8 (cut)
    with BuildSketch(Plane.XY.offset(5)):
        with Locations((-112.274699266, 43.614722308)):
            Rectangle(SKETCH21_W, SKETCH21_H)
        with Locations((112.392365081, 43.614843257)):
            Rectangle(SKETCH21_W_2, SKETCH21_H_2)
    extrude(amount=-CUT_EXTRUDE8_DEPTH, mode=Mode.SUBTRACT)

    # Sketch22 → Boss-Extrude10 (add)
    with BuildSketch(Plane.XY.offset(5)):
        with BuildLine():
            Line((93.98569149, 89.947234922), (85.325437452, 89.947234922))
            ThreePointArc((85.325437452, 89.947234922), (89.655564471, 92.447234922), (93.98569149, 89.947234922))
        make_face()
        with BuildLine():
            Line((-93.98569149, 89.947234922), (-85.325437452, 89.947234922))
            ThreePointArc((-85.325437452, 89.947234922), (-89.655564471, 92.447234922), (-93.98569149, 89.947234922))
        make_face()
    extrude(amount=-BOSS_EXTRUDE10_DEPTH)

    # Sketch23 → Cut-Extrude9 (cut)
    with BuildSketch(Plane.XY.offset(5)):
        with Locations((89.655564471, 87.447234922)):
            Circle(SKETCH23_R)
        with Locations((-89.655564471, 87.447234922)):
            Circle(SKETCH23_R)
    extrude(amount=-CUT_EXTRUDE9_DEPTH, mode=Mode.SUBTRACT)


solid = part.part
